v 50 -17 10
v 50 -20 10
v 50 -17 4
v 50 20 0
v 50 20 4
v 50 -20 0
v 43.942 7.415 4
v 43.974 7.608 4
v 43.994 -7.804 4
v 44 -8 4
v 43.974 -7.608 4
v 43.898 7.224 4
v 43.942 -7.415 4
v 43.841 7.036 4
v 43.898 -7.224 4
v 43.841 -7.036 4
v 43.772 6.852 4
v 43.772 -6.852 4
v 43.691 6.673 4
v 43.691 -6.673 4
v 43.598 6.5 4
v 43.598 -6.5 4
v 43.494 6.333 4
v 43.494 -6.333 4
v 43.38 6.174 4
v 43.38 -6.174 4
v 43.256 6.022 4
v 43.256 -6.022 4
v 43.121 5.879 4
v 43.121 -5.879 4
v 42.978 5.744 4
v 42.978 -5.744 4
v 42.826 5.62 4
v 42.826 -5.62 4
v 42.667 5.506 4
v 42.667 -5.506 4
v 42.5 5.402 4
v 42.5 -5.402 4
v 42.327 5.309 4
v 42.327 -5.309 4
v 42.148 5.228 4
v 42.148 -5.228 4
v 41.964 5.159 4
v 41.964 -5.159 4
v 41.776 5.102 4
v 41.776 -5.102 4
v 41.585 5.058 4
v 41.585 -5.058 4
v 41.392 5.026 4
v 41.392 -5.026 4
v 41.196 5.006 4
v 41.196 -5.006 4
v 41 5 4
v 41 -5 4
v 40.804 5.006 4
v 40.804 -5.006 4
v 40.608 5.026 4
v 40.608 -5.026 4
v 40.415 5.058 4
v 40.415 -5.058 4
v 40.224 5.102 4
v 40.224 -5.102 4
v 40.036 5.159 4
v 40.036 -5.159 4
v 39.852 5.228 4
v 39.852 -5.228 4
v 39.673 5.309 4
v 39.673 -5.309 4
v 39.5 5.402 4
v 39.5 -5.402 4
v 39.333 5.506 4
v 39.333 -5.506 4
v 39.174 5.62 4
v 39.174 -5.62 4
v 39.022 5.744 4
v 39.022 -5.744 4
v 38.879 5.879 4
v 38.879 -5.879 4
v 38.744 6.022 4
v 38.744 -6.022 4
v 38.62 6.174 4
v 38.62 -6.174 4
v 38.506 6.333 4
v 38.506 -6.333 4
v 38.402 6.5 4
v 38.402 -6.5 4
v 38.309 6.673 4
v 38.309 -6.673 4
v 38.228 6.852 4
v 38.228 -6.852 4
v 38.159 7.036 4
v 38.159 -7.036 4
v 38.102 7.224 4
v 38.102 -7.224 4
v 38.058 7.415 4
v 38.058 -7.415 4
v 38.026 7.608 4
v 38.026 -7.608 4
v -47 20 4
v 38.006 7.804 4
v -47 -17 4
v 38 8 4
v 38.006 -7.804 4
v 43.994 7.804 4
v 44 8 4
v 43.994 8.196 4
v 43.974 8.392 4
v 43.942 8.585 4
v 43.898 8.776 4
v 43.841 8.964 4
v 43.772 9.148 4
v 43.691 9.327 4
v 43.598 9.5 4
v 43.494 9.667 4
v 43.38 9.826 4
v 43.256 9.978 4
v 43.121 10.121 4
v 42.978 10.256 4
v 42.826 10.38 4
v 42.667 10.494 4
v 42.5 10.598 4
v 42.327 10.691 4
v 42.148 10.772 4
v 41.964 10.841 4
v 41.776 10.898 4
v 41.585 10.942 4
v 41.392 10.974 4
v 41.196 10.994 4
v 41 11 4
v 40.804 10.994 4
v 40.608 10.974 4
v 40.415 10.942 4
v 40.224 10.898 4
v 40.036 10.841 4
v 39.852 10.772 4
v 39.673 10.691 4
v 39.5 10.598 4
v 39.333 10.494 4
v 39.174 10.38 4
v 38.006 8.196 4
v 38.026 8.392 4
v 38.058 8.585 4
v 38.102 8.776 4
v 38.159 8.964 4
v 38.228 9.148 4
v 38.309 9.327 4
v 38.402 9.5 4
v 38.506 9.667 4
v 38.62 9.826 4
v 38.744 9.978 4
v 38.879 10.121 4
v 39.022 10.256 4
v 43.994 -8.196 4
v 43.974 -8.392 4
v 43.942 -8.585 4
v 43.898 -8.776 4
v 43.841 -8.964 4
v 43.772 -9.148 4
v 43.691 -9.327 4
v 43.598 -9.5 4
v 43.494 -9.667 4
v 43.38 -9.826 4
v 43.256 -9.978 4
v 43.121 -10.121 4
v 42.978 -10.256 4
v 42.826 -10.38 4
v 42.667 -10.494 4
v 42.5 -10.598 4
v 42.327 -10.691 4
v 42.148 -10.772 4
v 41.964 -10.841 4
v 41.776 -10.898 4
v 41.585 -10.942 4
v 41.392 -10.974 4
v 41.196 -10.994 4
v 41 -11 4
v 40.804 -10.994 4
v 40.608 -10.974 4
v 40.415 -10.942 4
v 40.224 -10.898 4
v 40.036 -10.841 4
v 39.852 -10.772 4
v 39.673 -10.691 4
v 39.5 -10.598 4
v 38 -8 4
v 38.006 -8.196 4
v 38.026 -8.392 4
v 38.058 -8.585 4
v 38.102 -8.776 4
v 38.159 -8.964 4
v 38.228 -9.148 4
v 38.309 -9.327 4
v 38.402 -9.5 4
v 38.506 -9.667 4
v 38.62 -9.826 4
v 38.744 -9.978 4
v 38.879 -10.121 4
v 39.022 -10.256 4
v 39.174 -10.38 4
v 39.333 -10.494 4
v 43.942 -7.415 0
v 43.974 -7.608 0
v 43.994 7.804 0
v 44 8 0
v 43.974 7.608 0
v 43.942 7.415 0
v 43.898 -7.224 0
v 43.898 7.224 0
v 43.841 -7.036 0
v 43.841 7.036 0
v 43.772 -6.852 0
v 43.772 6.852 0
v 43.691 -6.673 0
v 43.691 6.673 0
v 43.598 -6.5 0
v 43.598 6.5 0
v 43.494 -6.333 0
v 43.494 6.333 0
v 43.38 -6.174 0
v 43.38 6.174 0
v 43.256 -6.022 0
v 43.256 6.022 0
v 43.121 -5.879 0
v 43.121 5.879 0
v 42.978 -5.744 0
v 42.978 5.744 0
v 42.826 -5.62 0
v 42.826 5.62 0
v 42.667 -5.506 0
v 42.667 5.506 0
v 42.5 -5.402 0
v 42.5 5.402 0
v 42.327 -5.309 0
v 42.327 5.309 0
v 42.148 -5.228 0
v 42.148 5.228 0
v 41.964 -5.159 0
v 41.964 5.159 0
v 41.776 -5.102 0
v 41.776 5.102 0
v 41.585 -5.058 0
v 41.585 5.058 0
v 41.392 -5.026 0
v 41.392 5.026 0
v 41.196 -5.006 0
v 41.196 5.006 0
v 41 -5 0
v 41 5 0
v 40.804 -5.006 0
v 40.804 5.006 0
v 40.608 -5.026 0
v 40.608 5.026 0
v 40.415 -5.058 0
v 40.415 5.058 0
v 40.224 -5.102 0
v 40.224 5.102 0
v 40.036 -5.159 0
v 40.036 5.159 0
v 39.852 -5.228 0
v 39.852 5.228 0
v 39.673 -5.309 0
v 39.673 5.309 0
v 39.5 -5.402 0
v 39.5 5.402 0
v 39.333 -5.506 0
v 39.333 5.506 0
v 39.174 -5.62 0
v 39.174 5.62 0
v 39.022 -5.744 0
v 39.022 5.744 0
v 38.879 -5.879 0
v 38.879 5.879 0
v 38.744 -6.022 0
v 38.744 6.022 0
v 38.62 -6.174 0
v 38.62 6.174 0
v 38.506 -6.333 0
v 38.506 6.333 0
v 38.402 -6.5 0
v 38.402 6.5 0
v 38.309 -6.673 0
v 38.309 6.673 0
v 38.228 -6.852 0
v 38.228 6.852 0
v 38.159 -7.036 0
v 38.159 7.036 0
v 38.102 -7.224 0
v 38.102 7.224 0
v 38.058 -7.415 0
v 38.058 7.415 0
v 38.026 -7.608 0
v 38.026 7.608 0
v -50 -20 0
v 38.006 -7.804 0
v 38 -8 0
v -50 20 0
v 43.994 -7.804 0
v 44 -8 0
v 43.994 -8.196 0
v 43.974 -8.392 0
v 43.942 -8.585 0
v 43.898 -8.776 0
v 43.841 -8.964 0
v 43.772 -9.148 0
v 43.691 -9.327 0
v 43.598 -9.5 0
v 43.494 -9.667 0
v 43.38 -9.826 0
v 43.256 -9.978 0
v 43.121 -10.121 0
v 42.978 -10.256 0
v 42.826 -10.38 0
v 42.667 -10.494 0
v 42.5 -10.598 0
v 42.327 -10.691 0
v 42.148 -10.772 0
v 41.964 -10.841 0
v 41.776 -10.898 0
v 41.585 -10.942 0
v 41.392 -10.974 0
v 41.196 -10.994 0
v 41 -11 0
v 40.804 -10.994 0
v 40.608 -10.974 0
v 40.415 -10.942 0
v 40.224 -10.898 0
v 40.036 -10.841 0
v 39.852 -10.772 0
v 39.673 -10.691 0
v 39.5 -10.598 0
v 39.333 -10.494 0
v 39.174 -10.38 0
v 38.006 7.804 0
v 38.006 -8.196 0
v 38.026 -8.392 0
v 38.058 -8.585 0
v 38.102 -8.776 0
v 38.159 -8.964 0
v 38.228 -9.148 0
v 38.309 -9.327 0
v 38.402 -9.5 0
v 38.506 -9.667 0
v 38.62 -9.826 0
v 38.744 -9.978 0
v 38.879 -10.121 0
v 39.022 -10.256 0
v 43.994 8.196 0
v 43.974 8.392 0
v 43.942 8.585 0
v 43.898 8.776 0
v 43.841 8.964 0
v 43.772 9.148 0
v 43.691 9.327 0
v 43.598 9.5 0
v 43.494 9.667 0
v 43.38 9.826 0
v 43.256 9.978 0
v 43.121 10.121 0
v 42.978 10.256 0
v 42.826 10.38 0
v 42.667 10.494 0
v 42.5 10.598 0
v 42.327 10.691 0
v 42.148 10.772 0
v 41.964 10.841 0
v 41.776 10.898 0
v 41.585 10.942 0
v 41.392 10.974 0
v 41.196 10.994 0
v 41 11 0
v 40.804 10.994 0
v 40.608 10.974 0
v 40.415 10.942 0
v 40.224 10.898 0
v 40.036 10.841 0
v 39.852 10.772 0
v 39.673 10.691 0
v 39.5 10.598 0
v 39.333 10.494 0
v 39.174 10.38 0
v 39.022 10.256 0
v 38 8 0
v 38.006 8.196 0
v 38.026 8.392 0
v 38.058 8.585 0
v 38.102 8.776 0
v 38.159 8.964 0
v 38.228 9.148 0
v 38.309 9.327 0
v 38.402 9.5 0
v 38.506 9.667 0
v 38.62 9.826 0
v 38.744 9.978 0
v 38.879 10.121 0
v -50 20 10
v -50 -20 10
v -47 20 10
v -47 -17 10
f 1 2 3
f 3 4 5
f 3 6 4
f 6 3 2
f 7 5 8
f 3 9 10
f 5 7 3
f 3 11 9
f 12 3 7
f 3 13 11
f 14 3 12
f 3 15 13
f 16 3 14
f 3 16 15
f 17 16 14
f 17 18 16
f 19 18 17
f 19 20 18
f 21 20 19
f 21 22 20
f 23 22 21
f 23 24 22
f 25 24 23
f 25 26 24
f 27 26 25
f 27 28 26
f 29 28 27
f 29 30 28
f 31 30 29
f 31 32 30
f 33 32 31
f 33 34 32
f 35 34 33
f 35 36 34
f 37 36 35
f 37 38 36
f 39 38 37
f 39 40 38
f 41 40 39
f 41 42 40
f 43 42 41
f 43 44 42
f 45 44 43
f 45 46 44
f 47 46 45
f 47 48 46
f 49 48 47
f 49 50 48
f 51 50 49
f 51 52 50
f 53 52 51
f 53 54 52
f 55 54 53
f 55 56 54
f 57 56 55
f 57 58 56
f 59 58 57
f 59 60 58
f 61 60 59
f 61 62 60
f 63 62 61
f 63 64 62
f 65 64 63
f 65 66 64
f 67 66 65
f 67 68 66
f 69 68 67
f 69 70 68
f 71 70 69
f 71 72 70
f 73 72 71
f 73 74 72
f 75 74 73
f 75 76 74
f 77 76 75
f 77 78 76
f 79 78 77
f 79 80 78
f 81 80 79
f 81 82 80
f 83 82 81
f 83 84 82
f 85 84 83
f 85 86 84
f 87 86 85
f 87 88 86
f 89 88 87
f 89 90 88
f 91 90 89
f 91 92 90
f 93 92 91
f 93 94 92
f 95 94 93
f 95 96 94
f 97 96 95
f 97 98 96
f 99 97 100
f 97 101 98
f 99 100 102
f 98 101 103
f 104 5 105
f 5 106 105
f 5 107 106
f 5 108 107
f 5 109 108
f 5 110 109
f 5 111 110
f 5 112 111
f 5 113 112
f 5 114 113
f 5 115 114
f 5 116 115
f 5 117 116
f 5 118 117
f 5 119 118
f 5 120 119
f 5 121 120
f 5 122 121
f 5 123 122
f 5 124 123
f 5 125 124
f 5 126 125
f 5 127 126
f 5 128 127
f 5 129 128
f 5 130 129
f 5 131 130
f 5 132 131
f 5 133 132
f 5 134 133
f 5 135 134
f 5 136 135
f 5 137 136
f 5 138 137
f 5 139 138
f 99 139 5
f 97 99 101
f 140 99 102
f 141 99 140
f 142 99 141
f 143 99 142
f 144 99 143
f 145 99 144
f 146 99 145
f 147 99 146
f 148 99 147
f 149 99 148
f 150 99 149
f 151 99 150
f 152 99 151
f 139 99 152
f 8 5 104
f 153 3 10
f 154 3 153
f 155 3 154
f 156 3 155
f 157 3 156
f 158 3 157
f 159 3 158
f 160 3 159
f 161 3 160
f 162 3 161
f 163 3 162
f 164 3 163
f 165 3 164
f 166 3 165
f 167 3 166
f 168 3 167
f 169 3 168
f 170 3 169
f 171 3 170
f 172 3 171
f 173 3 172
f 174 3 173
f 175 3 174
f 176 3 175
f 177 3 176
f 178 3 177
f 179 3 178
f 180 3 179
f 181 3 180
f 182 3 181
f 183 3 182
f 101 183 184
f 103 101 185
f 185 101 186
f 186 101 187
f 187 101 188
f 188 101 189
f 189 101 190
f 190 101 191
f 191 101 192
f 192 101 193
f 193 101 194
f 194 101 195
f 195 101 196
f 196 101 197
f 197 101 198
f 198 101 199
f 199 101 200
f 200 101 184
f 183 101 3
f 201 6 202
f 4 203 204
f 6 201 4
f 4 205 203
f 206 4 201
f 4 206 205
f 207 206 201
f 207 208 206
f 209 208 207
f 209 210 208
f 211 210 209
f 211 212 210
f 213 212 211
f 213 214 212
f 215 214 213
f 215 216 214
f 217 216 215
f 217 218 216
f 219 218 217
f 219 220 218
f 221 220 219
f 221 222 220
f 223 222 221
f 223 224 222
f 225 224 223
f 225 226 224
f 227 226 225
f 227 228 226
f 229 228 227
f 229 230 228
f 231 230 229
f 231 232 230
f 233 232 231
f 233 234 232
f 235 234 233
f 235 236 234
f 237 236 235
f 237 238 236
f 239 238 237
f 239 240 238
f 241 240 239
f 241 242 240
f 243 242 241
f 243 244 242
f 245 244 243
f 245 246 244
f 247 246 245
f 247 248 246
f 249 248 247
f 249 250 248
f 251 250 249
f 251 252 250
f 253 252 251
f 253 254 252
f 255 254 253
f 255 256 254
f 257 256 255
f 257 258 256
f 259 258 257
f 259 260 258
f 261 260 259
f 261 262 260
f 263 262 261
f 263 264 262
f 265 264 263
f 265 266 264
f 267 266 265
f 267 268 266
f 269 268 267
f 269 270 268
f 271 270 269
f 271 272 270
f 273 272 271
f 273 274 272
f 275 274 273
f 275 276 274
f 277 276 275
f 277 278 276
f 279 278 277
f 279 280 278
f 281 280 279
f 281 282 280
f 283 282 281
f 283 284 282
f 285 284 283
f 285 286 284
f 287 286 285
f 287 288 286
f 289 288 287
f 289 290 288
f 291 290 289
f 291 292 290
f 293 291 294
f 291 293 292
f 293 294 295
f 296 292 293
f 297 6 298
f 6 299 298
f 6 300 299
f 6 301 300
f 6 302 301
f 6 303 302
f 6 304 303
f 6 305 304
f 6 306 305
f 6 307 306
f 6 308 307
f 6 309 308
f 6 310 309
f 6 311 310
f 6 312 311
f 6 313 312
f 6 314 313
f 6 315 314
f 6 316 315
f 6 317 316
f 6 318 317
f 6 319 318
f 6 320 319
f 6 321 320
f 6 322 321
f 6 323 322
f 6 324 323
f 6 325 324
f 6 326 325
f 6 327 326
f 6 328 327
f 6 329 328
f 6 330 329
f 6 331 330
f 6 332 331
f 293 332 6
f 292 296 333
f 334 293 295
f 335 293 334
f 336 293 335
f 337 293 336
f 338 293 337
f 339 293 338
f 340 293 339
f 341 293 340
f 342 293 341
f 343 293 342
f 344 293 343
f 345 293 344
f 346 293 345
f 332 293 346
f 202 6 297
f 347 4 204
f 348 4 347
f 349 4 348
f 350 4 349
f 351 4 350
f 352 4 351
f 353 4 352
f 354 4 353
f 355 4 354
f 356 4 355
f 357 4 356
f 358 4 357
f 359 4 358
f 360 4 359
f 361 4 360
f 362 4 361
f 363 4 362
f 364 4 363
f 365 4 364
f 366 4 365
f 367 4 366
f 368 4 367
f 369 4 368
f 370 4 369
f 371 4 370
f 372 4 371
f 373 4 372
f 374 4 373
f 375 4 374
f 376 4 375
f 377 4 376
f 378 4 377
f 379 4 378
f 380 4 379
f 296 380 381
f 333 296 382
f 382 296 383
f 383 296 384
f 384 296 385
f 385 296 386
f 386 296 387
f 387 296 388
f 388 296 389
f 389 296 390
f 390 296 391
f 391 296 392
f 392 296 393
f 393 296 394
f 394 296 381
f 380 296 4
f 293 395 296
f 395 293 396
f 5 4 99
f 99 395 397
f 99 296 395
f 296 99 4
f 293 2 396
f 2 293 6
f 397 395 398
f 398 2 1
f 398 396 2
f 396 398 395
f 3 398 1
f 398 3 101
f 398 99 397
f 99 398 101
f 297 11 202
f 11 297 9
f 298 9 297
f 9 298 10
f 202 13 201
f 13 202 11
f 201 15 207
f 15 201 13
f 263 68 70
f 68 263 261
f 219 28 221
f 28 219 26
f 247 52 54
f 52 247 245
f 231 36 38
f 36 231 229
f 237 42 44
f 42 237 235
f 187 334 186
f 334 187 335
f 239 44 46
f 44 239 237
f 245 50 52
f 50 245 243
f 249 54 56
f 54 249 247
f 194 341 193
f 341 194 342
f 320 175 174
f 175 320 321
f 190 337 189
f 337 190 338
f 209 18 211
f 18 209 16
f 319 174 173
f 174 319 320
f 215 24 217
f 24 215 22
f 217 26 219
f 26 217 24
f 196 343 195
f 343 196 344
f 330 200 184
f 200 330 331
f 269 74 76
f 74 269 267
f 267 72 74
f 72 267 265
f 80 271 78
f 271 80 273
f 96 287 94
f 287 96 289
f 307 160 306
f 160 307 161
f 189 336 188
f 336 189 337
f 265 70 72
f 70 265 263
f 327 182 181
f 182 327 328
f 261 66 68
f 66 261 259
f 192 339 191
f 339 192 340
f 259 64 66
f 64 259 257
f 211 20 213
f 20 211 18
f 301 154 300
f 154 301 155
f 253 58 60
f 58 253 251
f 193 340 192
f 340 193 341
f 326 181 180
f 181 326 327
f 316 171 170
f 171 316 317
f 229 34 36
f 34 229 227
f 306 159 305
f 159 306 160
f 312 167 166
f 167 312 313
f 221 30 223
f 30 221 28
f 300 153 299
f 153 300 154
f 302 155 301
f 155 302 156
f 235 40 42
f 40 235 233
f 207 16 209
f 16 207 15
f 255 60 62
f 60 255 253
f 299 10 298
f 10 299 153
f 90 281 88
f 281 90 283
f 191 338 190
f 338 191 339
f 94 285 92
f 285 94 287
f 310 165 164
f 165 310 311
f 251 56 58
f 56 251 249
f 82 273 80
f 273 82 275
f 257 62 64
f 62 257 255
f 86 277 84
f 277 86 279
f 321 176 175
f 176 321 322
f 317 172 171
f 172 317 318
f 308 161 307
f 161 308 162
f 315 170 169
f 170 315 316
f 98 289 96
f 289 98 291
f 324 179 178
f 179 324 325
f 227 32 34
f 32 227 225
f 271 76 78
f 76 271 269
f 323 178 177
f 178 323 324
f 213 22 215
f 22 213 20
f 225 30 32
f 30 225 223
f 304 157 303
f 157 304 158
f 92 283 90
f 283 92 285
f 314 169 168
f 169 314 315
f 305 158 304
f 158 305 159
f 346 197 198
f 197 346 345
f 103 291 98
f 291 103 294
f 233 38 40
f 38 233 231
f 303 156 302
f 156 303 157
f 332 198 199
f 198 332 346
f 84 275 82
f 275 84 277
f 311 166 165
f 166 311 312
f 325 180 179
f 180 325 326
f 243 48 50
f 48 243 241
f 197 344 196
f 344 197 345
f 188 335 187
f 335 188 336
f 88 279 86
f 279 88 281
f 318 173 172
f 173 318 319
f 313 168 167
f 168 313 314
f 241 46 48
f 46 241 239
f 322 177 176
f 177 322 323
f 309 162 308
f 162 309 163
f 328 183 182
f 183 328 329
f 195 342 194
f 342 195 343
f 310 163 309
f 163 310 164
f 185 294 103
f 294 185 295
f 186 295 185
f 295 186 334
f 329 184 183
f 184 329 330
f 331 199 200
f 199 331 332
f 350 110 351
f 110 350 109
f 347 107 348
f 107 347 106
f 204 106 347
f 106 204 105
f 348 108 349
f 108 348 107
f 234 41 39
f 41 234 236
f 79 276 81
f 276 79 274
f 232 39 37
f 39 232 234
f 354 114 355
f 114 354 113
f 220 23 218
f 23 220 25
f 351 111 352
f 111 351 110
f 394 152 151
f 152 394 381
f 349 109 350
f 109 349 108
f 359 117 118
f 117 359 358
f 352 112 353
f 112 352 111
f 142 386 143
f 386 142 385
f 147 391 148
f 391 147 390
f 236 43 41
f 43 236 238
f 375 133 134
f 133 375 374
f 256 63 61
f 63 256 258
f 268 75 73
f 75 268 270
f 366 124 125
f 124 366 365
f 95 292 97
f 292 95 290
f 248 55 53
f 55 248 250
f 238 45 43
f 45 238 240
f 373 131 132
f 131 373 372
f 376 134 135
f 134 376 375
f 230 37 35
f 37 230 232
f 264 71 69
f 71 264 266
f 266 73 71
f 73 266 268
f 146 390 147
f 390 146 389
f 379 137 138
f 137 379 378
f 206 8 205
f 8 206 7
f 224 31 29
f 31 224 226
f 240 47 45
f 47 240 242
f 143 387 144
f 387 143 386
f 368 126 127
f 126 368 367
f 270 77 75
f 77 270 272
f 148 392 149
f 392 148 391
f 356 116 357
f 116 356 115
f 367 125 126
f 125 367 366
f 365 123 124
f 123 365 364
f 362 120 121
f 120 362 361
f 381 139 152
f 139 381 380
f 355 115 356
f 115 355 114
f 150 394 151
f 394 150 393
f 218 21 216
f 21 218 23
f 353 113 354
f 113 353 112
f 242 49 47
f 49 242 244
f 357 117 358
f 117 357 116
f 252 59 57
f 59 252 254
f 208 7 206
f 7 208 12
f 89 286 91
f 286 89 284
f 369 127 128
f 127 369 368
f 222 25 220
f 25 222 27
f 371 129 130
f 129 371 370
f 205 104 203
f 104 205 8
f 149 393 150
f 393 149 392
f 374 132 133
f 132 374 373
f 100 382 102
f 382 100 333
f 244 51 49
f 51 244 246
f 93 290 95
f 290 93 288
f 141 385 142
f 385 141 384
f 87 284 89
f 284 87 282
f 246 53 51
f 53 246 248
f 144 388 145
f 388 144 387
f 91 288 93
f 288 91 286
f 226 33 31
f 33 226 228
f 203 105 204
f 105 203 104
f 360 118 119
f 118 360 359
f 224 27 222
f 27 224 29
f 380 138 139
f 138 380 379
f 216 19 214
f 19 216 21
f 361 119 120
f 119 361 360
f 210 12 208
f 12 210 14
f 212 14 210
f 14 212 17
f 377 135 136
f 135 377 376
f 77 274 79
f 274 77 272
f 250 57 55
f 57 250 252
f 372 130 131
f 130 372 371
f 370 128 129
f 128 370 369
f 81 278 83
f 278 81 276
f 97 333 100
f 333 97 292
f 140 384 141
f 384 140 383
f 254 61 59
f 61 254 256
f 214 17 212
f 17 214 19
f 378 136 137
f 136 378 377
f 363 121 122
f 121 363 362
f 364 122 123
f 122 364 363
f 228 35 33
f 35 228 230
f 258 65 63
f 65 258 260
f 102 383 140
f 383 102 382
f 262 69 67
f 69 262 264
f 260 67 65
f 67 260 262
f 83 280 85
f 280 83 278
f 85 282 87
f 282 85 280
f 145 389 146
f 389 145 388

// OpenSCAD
// Microscope-slide registration jig with two clamp holes
// Category: benchware; Purpose: repeatable origin when photographing a 75 x 25 mm microscope slide.
// Print: FDM, on the broad bottom face at z=0; no support required.
// This is a geometric reference design; no dimensional fit or lab use has been physically validated.
// SPDX-License-Identifier: CERN-OHL-P-2.0

/* [Platform] */
// Overall platform length, X (mm)
base_l = 100; // 0.5
// Overall platform width, Y (mm)
base_w = 40; // 0.5
// Platform thickness (mm)
base_h = 4; // 0.5

/* [Registration Edges] */
// Width of each perpendicular registration rail (mm)
rail_w = 3; // 0.1
// Height of rails above print bed (mm)
rail_top = 10; // 0.5

/* [Fasteners] */
// Diameter of each right-side mounting hole (mm)
bore_d = 6.0; // 0.1
// X coordinate of the mounting-hole centers (mm)
bore_x = 41; // 0.5
// Absolute Y coordinate of mounting-hole centers (mm)
bore_y = 8; // 0.5

/* [Hidden] */
$fn = 96;
eps = 0.1;
assert(base_l >= 90 && base_w >= 35);
assert(rail_w >= 1.6 && rail_top >= base_h + 2);
assert(bore_d > 0 && bore_d < 8);
assert(bore_x + bore_d/2 < base_l/2 - 1);
assert(bore_x - bore_d/2 > -base_l/2 + rail_w + 1);
assert(bore_y + bore_d/2 < base_w/2 - 1);
assert(bore_y - bore_d/2 > -base_w/2 + rail_w + 1);
assert(bore_d / 2 + 2 < bore_y);

difference() {
    union() {
        translate([-base_l/2, -base_w/2, 0])
            cube([base_l, base_w, base_h]);
        translate([-base_l/2, -base_w/2, base_h])
            cube([base_l, rail_w, rail_top-base_h]);
        translate([-base_l/2, -base_w/2, base_h])
            cube([rail_w, base_w, rail_top-base_h]);
    }
    for (sign=[-1,1])
        translate([bore_x, sign*bore_y, -eps])
            cylinder(h=base_h+2*eps, d=bore_d);
}
